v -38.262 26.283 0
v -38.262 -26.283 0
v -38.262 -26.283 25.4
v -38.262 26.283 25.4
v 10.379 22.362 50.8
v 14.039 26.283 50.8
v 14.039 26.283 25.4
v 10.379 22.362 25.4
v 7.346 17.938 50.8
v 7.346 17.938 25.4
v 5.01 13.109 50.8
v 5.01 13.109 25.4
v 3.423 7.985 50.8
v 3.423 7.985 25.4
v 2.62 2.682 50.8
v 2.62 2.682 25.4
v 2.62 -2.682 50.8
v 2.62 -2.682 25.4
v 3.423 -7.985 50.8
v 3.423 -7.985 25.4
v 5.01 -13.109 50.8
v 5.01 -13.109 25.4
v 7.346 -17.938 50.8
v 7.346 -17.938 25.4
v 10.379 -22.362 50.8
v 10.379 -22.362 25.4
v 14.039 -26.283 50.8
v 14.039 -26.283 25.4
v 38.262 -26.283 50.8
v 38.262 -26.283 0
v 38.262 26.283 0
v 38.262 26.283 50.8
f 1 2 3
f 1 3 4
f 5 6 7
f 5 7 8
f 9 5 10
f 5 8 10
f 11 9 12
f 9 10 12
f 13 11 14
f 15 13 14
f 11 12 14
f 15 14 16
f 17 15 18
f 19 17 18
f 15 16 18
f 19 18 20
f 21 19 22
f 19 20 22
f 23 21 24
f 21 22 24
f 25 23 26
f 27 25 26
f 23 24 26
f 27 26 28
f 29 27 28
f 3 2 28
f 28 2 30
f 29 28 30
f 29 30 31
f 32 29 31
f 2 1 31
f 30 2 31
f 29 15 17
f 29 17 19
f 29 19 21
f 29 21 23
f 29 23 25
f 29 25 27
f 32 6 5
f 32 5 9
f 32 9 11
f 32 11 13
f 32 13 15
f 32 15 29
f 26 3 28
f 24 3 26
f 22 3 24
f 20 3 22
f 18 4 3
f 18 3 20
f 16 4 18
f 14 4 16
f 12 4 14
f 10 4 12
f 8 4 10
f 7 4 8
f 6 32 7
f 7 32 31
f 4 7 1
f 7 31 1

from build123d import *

# Parameters (mm, degrees)
F0_W     = 76.52381
F0_H     = 52.565604
F1_DEPTH = 25.4
F3_DEPTH = 25.4


with BuildPart() as f1:
    # F0 (on Top) → F1 (new body)
    with BuildSketch(Plane.XY):
        Rectangle(F0_W, F0_H)
    extrude(amount=F1_DEPTH)

    # F2 (on face) → F3 (join)
    with BuildSketch(Plane.XY.offset(25.4)):
        with BuildLine():
            Line((38.261905, 26.282802), (14.039008, 26.282802))
            ThreePointArc((14.039008, 26.282802), (2.519291, 0), (14.039008, -26.282802))
            Line((14.039008, -26.282802), (38.261905, -26.282802))
            Line((38.261905, -26.282802), (38.261905, 26.282802))
        make_face()
    extrude(amount=F3_DEPTH)


solid = f1.part
